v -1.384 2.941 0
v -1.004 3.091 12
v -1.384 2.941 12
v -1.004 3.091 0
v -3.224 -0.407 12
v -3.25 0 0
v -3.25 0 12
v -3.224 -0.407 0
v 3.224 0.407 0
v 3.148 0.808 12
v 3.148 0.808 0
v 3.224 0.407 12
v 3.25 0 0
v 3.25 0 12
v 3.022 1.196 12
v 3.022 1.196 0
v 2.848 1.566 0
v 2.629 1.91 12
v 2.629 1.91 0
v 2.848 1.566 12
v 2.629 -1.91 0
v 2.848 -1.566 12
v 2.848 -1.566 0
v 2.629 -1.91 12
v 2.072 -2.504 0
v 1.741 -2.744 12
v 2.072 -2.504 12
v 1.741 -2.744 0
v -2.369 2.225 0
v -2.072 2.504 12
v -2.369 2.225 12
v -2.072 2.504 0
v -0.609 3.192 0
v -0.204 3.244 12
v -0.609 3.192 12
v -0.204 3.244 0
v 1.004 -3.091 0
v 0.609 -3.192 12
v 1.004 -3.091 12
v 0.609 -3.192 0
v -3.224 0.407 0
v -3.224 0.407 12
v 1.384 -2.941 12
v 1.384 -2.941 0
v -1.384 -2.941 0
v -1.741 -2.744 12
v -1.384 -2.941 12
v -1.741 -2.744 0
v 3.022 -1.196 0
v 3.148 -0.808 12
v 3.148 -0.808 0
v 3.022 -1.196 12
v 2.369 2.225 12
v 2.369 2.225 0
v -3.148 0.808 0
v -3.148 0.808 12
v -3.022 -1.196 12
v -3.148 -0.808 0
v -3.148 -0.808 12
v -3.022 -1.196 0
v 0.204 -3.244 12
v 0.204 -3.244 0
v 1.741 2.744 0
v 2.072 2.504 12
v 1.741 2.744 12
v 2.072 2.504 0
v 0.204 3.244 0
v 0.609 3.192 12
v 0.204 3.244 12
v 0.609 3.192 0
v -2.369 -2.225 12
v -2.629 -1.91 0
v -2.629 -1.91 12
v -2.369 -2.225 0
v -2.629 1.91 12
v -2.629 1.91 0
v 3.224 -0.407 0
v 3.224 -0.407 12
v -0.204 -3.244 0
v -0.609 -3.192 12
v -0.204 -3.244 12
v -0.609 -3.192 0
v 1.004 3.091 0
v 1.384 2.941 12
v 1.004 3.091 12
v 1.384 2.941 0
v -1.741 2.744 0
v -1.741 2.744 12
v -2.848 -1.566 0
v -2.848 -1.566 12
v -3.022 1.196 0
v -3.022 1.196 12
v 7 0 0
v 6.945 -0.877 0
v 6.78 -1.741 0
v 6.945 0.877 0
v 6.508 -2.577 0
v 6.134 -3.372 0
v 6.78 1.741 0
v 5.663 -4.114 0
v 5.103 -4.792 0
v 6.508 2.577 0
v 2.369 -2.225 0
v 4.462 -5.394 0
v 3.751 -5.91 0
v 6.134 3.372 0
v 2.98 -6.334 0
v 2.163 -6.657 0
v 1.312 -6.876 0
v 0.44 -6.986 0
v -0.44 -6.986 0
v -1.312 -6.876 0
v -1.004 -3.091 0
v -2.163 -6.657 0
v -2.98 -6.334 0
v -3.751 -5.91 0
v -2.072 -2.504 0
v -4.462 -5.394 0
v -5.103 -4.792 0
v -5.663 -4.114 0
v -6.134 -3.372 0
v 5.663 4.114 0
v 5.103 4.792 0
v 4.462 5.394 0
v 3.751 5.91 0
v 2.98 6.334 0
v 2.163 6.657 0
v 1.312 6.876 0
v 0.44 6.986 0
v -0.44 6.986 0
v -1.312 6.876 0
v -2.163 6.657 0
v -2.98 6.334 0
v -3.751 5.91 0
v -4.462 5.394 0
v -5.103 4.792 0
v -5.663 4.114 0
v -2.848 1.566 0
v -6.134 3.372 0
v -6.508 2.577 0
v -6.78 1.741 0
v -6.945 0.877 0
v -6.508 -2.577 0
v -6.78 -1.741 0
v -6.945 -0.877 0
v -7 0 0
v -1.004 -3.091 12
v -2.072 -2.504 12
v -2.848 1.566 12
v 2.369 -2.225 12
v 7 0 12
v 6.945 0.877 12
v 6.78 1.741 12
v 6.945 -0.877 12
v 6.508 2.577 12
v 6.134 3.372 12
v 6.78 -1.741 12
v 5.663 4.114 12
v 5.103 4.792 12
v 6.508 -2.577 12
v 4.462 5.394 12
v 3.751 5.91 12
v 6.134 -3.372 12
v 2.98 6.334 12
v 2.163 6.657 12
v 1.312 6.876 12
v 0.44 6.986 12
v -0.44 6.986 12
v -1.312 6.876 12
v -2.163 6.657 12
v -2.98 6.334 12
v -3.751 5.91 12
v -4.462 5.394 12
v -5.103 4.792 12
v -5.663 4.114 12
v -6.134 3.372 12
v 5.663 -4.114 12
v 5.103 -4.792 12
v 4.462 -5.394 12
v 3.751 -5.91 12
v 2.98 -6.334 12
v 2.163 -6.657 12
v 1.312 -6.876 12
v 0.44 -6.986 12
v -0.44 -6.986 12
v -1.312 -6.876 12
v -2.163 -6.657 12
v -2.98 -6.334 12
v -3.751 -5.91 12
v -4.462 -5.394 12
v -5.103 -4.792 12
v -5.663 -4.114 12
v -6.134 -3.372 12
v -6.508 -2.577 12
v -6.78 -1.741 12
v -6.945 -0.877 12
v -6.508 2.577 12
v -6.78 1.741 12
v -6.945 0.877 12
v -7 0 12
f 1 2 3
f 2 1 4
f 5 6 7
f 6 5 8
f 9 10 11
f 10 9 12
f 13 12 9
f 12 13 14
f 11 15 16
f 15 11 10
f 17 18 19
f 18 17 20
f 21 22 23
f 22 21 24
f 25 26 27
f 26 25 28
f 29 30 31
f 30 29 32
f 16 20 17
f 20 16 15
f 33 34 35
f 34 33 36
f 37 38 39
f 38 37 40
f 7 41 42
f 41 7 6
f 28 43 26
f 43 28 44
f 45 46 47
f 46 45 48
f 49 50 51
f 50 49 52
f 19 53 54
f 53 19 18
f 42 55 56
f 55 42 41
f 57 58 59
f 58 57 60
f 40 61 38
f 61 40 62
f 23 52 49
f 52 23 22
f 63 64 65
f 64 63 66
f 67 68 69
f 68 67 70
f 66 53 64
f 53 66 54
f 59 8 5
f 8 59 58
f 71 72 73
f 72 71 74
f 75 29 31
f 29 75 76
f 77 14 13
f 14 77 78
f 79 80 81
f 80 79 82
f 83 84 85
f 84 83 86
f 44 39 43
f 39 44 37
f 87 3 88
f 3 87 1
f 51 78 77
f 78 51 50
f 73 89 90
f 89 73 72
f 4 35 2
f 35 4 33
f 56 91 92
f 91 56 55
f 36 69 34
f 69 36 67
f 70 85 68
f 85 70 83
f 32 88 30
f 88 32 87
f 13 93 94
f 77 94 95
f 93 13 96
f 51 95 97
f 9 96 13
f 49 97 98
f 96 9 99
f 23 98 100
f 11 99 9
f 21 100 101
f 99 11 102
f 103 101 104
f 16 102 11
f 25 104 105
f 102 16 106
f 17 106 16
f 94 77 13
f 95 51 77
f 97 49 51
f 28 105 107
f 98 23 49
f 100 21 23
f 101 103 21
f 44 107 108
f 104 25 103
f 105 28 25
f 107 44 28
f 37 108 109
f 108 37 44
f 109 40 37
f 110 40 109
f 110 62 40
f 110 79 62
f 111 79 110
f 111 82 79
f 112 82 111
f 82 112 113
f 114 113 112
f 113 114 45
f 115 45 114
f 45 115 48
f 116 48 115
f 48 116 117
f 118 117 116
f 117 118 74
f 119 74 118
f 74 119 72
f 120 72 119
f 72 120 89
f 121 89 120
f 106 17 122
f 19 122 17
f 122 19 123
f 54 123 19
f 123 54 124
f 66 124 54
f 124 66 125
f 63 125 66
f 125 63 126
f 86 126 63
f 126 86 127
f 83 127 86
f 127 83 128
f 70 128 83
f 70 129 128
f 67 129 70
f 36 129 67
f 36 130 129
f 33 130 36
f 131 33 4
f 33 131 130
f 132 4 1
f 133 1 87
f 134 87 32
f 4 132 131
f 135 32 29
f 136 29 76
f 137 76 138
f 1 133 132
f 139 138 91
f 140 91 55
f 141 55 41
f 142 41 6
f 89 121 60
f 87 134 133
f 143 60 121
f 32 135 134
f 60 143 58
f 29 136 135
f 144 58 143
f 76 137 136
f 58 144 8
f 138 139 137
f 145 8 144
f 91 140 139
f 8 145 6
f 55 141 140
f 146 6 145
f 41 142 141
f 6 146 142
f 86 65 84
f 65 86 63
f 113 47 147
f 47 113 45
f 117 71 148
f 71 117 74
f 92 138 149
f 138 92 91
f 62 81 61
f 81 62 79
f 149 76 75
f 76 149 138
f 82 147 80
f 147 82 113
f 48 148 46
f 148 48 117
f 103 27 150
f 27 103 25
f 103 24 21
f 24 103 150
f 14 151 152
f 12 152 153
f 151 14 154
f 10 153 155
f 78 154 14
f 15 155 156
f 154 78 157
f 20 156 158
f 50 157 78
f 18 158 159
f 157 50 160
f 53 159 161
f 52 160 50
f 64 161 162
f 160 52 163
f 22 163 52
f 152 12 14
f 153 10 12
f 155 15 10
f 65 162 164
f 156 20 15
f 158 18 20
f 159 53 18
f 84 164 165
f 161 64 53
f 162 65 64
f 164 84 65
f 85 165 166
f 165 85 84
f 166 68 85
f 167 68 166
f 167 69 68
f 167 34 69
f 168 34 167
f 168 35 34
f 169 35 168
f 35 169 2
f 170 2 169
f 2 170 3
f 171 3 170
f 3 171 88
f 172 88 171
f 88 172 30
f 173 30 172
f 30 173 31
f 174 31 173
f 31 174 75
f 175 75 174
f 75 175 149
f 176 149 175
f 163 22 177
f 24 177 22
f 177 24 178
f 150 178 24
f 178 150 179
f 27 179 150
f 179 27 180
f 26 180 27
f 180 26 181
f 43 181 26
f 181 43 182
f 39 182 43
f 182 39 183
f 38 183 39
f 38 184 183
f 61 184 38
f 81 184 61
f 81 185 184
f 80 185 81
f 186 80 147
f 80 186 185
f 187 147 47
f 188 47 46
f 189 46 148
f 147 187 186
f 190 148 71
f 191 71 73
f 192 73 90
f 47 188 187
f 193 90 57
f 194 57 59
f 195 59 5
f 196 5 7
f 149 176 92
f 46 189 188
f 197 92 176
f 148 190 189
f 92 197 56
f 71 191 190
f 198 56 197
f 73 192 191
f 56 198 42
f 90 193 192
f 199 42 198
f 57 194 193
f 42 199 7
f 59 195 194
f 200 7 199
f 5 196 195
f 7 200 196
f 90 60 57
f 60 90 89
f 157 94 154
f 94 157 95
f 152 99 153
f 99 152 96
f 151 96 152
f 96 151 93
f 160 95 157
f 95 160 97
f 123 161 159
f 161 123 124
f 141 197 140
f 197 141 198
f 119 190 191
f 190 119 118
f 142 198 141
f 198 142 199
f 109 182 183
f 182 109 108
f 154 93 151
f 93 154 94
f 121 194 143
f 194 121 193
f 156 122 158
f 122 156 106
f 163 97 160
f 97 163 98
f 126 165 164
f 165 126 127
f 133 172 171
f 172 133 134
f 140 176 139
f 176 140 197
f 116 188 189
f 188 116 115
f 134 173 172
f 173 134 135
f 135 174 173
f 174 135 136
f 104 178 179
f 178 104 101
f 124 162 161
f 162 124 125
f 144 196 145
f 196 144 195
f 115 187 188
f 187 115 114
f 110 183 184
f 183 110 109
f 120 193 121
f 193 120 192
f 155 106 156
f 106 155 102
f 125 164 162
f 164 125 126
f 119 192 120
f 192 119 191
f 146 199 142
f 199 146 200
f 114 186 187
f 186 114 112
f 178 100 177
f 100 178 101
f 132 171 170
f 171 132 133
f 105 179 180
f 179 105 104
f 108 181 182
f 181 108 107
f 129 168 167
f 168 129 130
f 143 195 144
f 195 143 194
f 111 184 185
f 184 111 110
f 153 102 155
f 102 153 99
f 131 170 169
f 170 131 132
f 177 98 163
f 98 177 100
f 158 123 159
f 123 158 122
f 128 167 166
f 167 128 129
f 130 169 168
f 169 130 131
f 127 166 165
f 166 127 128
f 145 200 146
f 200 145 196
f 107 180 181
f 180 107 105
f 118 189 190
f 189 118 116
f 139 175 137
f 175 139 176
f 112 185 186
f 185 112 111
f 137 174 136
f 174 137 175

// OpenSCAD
$fn = 50;


difference() {
	union() {
		cylinder(h = 12, r = 7.0000000000);
	}
	union() {
		cylinder(h = 12, r = 3.2500000000);
		cylinder(h = 12, r = 3.2500000000);
		cylinder(h = 12, r = 1.8000000000);
		cylinder(h = 12, r = 1.8000000000);
		cylinder(h = 12, r = 1.8000000000);
		cylinder(h = 12, r = 1.8000000000);
		cylinder(h = 12, r = 1.8000000000);
		cylinder(h = 12, r = 1.8000000000);
	}
}
